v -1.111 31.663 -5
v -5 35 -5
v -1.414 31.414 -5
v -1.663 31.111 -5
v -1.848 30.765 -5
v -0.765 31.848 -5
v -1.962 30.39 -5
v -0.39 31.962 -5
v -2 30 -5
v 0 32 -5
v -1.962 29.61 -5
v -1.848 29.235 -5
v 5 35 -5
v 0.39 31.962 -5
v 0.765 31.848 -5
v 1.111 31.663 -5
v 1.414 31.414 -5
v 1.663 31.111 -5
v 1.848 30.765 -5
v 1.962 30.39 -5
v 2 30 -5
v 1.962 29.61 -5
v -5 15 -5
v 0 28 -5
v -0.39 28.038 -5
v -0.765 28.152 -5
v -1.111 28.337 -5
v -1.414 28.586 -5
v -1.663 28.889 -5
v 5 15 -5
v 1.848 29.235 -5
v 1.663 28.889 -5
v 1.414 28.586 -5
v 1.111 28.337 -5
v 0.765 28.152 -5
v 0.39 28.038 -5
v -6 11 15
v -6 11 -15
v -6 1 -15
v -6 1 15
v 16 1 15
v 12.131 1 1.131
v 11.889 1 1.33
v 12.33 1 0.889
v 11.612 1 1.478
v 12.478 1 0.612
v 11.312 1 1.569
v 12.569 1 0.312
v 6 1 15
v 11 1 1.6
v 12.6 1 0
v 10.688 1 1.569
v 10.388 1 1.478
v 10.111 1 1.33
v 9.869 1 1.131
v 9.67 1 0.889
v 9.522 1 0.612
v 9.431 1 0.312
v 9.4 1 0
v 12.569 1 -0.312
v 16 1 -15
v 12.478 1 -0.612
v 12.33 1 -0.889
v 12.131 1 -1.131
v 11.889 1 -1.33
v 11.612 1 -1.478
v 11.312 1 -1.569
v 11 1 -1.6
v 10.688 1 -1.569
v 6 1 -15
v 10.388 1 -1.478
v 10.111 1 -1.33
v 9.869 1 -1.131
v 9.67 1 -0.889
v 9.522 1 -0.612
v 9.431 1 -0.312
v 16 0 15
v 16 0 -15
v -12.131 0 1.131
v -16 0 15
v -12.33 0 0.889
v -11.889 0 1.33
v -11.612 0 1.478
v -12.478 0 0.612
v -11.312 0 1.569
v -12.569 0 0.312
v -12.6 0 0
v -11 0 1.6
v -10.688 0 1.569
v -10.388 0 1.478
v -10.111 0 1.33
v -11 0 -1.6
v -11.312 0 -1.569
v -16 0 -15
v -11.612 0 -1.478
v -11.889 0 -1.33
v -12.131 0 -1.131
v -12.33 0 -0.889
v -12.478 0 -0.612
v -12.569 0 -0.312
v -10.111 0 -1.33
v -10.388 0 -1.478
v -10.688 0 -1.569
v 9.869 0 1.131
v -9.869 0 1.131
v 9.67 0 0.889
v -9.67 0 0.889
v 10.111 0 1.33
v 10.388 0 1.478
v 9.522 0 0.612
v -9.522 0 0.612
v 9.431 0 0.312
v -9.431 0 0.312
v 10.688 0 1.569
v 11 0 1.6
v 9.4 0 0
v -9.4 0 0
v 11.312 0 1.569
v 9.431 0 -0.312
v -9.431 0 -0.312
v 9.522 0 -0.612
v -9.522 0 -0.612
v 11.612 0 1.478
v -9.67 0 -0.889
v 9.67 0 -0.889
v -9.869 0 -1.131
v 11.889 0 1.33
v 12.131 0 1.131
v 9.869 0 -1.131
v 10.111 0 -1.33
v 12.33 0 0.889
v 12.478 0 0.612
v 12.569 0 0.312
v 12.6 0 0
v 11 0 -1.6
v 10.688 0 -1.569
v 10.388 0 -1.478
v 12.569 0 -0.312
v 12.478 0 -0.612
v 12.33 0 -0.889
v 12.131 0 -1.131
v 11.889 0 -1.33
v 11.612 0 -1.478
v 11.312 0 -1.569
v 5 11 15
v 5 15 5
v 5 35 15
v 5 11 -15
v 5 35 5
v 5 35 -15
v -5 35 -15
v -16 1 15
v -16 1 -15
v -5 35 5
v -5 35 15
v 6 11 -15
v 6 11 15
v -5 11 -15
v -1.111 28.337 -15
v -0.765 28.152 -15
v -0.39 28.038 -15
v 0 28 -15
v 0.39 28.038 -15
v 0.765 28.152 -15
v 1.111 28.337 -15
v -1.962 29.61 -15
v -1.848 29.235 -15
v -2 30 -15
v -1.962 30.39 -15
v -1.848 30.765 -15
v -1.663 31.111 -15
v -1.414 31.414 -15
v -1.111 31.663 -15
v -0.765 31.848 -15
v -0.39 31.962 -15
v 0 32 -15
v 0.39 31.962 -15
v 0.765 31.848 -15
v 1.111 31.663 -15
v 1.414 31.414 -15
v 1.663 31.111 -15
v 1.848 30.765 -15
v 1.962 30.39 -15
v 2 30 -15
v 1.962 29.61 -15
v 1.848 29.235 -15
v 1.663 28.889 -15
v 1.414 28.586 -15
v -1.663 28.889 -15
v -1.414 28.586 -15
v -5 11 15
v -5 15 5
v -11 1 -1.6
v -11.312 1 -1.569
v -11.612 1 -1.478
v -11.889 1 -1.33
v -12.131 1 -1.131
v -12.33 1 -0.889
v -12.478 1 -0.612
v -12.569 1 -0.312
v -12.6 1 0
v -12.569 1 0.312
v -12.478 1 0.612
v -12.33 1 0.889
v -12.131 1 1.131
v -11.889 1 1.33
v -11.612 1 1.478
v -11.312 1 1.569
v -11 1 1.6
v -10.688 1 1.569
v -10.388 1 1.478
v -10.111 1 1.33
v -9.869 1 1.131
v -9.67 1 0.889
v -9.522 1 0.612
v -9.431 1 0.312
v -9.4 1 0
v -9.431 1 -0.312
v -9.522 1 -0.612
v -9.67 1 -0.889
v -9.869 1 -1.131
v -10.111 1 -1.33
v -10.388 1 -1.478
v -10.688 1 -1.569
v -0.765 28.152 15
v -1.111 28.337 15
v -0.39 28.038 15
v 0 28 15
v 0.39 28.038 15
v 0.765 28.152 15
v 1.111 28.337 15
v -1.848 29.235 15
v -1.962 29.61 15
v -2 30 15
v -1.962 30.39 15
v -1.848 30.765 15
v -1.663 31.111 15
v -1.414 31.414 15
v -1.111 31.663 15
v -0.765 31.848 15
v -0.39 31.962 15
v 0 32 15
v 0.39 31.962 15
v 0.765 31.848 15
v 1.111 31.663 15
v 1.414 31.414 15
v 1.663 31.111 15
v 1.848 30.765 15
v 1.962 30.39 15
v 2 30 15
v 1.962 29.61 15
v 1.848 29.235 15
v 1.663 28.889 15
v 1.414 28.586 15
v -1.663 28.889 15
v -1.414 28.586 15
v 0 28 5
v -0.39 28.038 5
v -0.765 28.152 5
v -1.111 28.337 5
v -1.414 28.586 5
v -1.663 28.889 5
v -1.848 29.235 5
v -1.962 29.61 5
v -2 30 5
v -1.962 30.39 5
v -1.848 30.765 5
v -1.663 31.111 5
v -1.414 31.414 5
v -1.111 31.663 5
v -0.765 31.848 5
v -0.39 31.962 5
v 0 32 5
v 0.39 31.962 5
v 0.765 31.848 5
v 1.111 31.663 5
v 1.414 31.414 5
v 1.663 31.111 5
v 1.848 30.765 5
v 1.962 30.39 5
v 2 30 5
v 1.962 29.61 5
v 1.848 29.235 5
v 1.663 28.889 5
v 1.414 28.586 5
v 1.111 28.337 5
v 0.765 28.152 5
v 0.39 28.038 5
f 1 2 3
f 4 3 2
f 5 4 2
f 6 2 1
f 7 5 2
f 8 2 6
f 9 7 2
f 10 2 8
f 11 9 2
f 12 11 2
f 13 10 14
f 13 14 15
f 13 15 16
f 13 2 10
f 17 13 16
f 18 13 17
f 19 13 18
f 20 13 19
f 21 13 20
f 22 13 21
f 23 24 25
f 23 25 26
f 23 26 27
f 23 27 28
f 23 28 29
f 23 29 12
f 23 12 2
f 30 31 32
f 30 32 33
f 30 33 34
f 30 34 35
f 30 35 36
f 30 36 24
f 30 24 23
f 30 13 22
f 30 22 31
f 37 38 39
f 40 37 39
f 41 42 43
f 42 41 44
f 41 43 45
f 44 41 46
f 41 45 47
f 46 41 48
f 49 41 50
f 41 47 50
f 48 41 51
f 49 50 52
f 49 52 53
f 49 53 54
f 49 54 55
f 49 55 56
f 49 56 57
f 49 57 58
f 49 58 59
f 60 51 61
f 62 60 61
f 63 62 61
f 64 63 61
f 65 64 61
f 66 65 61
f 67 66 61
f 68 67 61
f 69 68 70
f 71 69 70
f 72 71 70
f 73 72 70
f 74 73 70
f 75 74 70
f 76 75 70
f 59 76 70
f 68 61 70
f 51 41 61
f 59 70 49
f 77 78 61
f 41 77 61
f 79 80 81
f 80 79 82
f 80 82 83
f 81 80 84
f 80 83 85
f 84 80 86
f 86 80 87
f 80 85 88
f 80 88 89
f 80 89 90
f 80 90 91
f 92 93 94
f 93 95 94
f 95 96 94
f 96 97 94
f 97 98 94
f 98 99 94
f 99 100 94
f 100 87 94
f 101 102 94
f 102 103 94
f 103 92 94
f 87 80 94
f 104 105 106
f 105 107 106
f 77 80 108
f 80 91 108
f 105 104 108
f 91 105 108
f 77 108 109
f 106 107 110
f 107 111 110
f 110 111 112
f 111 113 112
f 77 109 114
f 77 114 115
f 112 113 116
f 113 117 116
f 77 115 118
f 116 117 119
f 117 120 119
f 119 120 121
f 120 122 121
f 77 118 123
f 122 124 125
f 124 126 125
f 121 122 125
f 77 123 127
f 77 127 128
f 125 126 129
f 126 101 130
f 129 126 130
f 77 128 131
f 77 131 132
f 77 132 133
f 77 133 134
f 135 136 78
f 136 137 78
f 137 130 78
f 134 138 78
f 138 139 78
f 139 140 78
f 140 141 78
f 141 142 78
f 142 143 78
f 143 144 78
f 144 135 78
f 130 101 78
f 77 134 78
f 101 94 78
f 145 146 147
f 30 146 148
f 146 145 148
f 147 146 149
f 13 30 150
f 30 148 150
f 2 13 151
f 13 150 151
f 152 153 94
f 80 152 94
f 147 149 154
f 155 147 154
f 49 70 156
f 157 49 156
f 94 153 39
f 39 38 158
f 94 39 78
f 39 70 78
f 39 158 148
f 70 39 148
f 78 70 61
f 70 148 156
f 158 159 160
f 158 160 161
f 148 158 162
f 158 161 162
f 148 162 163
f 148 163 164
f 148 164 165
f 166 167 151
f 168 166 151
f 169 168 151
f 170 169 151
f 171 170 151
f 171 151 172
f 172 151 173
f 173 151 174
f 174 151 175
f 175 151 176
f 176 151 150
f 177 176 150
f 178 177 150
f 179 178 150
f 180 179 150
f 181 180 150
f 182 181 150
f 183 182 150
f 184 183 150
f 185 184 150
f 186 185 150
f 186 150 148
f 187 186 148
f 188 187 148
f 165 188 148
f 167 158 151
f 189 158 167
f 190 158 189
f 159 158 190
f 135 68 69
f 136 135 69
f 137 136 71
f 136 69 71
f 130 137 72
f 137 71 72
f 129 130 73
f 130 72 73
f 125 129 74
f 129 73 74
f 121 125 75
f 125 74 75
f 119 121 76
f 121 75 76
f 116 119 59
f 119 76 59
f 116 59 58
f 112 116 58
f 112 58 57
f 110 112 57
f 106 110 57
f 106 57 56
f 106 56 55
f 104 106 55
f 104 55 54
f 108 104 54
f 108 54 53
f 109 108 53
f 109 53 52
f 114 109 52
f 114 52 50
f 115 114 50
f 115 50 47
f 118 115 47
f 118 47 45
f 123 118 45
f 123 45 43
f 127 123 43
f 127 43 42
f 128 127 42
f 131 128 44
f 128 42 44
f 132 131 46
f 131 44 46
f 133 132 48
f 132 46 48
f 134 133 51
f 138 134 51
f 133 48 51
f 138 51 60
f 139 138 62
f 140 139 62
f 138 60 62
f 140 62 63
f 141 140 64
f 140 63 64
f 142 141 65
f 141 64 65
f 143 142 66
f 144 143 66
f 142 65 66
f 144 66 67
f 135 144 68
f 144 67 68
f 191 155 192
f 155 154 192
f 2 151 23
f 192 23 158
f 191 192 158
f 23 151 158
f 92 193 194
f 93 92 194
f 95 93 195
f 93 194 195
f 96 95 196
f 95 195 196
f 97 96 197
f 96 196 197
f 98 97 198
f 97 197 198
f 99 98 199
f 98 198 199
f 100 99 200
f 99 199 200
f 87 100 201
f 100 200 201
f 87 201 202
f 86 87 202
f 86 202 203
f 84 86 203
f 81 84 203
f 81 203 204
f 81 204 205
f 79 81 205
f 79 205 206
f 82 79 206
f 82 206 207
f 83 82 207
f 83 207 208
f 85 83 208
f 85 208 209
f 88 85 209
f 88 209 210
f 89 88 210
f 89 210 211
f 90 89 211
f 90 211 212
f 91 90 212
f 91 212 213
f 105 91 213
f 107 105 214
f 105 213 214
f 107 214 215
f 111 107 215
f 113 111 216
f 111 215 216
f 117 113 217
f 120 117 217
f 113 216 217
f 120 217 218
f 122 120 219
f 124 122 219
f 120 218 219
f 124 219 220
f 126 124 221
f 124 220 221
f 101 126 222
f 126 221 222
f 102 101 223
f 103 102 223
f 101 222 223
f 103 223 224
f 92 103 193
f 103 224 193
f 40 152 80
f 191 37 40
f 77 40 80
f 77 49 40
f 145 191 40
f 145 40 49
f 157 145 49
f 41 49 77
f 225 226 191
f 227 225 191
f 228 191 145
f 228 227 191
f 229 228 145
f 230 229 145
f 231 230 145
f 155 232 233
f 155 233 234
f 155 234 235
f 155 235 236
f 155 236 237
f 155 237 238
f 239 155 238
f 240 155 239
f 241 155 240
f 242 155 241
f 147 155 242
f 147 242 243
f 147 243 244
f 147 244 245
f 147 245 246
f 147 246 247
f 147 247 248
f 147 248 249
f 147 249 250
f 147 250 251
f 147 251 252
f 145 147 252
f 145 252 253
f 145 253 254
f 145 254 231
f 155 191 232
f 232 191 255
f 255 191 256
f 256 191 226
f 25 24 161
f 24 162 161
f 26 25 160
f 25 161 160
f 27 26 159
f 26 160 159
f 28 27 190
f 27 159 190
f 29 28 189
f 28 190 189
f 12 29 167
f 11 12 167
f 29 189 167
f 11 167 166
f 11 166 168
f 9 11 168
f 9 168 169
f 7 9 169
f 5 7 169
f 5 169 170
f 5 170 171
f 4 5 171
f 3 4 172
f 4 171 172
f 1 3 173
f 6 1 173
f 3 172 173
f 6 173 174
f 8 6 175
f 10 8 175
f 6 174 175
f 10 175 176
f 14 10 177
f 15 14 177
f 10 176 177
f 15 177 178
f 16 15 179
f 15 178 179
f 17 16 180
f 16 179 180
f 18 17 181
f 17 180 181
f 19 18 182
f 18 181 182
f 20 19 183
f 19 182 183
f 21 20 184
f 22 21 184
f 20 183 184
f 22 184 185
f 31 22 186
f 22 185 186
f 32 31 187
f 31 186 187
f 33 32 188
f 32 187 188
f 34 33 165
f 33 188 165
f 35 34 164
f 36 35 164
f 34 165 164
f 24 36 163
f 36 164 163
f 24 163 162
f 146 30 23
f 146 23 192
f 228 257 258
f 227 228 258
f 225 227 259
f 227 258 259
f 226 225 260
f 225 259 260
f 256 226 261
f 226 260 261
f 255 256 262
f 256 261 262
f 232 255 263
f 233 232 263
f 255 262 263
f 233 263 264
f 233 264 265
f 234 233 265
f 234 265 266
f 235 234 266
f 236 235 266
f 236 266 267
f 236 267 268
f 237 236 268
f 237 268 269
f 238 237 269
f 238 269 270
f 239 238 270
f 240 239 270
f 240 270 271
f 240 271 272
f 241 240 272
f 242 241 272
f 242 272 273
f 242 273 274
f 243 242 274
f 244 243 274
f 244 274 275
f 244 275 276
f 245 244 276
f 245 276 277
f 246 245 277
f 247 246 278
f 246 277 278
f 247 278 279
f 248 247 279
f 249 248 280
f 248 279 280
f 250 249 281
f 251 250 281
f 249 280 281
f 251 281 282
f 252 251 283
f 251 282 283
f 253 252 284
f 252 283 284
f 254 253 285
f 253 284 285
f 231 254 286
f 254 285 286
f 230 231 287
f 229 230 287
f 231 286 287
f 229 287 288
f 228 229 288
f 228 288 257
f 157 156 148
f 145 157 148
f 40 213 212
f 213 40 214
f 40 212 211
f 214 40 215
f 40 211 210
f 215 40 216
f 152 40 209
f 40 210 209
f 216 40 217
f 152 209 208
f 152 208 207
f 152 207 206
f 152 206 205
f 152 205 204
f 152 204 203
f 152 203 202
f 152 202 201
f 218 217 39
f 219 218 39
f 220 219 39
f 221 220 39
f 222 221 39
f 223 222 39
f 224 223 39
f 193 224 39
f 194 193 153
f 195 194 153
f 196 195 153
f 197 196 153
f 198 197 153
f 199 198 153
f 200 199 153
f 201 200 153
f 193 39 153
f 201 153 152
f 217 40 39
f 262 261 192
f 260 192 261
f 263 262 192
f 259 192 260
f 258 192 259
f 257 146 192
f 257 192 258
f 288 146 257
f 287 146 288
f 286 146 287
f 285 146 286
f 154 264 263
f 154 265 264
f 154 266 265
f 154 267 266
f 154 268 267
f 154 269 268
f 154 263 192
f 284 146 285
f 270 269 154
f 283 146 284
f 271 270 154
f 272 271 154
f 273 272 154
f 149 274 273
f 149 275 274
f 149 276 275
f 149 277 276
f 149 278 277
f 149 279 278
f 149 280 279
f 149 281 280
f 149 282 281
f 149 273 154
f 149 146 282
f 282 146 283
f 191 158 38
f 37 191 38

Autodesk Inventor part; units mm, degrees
ref_plane "YZ Plane" through (0, 0, 0) normal (1, 0, 0) x (0, 1, 0)
ref_plane "XZ Plane" through (0, 0, 0) normal (0, 1, 0) x (-1, 0, 0)
ref_plane "XY Plane" through (0, 0, 0) normal (0, 0, 1) x (1, 0, 0)
sketch "Náčrt1" plane through (0, 0, 0) normal (0, 0, 1) x (1, 0, 0)
  line L0 (-9.2032, 0) -> (20.2005, 0) projected
  line L1 (0, 42) -> (0, -7) projected
  line L2 (-5.0026, 0) -> (16, 0)
  line L3 (16, 0) -> (16, 1)
  line L4 (16, 1) -> (6, 1)
  line L5 (6, 1) -> (6, 11)
  line L6 (6, 11) -> (5, 11)
  line L7 (5, 11) -> (5, 35)
  line L8 (5, 35) -> (0, 35)
  line L9 (0, 35) -> (0, 0)
  line L10 (0, 0) -> (-5.0026, 0)
  line L11 (0, 0) -> (16, 0)
  point P0 (0, 0)
  point P1 (0, 35)
  point P2 (16, 0)
  dimension "d0" = 10
  dimension "d1" = 10
  dimension "d2" = 1
  dimension "d3" = 1
  dimension "d4" = 5
  dimension "d5" = 35
extrude "Vysunutí1" add sketch "Náčrt1" along normal mid plane 30
mirror "Zrcadlit1" about plane through (0, 35, 0) normal (-1, 0, 0) of "Vysunutí1"
sketch "Náčrt2" plane through (5, 11, 15) normal (1, 0, 0) x (0, 0, -1)
  line L0 (0, 24) -> (30, 24) projected
  line L1 (0, 0) -> (0, 24) projected
  line L2 (30, 0) -> (0, 0) projected
  line L3 (30, 24) -> (30, 0) projected
  line L4 (10, 24) -> (20, 24)
  line L5 (20, 24) -> (20, 4)
  line L6 (20, 4) -> (10, 4)
  line L7 (10, 4) -> (10, 24)
  line L8 (10, 24) -> (20, 24)
  point P0 (15, -11)
  point P1 (10, 0)
  point P2 (20, 0)
  dimension "d8" = 10
  dimension "d9" = 10
  dimension "d10" = 20
extrude "Vysunutí3" cut sketch "Náčrt2" against normal through all contours L0 L5 L6 L7
sketch "Náčrt3" plane through (0, 0, 15) normal (0, 0, 1) x (1, 0, 0)
  line L0 (5, 35) -> (-5, 35) projected
  line L1 (-5, 11) -> (-5, 35) projected
  line L2 (-6, 11) -> (-5, 11) projected
  line L3 (-6, 1) -> (-6, 11) projected
  line L4 (-16, 1) -> (-6, 1) projected
  line L5 (-16, 0) -> (-16, 1) projected
  line L6 (16, 0) -> (-16, 0) projected
  line L7 (16, 0) -> (16, 1) projected
  line L8 (16, 1) -> (6, 1) projected
  line L9 (6, 1) -> (6, 11) projected
  line L10 (6, 11) -> (5, 11) projected
  line L11 (5, 11) -> (5, 35) projected
  point P0 (0, 0)
  point P1 (0, 30)
  dimension "d15" = 5
  dimension "d16" = 5
hole "Díra1" at (0, 30, 15) direction (0, 0, -1) diameter 4 end through all
sketch "Náčrt4" plane through (16, 0, -15) normal (0, -1, 0) x (1, 0, 0)
  line L0 (-10, 0) -> (-10, 30) projected
  line L1 (0, 0) -> (0, 30) projected
  line L2 (0, 30) -> (-32, 30) projected
  line L3 (-32, 0) -> (-32, 30) projected
  line L4 (0, 0) -> (-32, 0) projected
  point P0 (-16, 15)
  point P1 (-5, 15)
  point P2 (-27, 15)
  dimension "d24" = 5
  dimension "d27" = 15
  dimension "d28" = 15
  dimension "d31" = 5
hole "Díra2" at (11, 0, 0) at (-11, 0, 0) direction (0, 1, 0) diameter 3.2 end through all
properties part number "y_bearing_holder"
